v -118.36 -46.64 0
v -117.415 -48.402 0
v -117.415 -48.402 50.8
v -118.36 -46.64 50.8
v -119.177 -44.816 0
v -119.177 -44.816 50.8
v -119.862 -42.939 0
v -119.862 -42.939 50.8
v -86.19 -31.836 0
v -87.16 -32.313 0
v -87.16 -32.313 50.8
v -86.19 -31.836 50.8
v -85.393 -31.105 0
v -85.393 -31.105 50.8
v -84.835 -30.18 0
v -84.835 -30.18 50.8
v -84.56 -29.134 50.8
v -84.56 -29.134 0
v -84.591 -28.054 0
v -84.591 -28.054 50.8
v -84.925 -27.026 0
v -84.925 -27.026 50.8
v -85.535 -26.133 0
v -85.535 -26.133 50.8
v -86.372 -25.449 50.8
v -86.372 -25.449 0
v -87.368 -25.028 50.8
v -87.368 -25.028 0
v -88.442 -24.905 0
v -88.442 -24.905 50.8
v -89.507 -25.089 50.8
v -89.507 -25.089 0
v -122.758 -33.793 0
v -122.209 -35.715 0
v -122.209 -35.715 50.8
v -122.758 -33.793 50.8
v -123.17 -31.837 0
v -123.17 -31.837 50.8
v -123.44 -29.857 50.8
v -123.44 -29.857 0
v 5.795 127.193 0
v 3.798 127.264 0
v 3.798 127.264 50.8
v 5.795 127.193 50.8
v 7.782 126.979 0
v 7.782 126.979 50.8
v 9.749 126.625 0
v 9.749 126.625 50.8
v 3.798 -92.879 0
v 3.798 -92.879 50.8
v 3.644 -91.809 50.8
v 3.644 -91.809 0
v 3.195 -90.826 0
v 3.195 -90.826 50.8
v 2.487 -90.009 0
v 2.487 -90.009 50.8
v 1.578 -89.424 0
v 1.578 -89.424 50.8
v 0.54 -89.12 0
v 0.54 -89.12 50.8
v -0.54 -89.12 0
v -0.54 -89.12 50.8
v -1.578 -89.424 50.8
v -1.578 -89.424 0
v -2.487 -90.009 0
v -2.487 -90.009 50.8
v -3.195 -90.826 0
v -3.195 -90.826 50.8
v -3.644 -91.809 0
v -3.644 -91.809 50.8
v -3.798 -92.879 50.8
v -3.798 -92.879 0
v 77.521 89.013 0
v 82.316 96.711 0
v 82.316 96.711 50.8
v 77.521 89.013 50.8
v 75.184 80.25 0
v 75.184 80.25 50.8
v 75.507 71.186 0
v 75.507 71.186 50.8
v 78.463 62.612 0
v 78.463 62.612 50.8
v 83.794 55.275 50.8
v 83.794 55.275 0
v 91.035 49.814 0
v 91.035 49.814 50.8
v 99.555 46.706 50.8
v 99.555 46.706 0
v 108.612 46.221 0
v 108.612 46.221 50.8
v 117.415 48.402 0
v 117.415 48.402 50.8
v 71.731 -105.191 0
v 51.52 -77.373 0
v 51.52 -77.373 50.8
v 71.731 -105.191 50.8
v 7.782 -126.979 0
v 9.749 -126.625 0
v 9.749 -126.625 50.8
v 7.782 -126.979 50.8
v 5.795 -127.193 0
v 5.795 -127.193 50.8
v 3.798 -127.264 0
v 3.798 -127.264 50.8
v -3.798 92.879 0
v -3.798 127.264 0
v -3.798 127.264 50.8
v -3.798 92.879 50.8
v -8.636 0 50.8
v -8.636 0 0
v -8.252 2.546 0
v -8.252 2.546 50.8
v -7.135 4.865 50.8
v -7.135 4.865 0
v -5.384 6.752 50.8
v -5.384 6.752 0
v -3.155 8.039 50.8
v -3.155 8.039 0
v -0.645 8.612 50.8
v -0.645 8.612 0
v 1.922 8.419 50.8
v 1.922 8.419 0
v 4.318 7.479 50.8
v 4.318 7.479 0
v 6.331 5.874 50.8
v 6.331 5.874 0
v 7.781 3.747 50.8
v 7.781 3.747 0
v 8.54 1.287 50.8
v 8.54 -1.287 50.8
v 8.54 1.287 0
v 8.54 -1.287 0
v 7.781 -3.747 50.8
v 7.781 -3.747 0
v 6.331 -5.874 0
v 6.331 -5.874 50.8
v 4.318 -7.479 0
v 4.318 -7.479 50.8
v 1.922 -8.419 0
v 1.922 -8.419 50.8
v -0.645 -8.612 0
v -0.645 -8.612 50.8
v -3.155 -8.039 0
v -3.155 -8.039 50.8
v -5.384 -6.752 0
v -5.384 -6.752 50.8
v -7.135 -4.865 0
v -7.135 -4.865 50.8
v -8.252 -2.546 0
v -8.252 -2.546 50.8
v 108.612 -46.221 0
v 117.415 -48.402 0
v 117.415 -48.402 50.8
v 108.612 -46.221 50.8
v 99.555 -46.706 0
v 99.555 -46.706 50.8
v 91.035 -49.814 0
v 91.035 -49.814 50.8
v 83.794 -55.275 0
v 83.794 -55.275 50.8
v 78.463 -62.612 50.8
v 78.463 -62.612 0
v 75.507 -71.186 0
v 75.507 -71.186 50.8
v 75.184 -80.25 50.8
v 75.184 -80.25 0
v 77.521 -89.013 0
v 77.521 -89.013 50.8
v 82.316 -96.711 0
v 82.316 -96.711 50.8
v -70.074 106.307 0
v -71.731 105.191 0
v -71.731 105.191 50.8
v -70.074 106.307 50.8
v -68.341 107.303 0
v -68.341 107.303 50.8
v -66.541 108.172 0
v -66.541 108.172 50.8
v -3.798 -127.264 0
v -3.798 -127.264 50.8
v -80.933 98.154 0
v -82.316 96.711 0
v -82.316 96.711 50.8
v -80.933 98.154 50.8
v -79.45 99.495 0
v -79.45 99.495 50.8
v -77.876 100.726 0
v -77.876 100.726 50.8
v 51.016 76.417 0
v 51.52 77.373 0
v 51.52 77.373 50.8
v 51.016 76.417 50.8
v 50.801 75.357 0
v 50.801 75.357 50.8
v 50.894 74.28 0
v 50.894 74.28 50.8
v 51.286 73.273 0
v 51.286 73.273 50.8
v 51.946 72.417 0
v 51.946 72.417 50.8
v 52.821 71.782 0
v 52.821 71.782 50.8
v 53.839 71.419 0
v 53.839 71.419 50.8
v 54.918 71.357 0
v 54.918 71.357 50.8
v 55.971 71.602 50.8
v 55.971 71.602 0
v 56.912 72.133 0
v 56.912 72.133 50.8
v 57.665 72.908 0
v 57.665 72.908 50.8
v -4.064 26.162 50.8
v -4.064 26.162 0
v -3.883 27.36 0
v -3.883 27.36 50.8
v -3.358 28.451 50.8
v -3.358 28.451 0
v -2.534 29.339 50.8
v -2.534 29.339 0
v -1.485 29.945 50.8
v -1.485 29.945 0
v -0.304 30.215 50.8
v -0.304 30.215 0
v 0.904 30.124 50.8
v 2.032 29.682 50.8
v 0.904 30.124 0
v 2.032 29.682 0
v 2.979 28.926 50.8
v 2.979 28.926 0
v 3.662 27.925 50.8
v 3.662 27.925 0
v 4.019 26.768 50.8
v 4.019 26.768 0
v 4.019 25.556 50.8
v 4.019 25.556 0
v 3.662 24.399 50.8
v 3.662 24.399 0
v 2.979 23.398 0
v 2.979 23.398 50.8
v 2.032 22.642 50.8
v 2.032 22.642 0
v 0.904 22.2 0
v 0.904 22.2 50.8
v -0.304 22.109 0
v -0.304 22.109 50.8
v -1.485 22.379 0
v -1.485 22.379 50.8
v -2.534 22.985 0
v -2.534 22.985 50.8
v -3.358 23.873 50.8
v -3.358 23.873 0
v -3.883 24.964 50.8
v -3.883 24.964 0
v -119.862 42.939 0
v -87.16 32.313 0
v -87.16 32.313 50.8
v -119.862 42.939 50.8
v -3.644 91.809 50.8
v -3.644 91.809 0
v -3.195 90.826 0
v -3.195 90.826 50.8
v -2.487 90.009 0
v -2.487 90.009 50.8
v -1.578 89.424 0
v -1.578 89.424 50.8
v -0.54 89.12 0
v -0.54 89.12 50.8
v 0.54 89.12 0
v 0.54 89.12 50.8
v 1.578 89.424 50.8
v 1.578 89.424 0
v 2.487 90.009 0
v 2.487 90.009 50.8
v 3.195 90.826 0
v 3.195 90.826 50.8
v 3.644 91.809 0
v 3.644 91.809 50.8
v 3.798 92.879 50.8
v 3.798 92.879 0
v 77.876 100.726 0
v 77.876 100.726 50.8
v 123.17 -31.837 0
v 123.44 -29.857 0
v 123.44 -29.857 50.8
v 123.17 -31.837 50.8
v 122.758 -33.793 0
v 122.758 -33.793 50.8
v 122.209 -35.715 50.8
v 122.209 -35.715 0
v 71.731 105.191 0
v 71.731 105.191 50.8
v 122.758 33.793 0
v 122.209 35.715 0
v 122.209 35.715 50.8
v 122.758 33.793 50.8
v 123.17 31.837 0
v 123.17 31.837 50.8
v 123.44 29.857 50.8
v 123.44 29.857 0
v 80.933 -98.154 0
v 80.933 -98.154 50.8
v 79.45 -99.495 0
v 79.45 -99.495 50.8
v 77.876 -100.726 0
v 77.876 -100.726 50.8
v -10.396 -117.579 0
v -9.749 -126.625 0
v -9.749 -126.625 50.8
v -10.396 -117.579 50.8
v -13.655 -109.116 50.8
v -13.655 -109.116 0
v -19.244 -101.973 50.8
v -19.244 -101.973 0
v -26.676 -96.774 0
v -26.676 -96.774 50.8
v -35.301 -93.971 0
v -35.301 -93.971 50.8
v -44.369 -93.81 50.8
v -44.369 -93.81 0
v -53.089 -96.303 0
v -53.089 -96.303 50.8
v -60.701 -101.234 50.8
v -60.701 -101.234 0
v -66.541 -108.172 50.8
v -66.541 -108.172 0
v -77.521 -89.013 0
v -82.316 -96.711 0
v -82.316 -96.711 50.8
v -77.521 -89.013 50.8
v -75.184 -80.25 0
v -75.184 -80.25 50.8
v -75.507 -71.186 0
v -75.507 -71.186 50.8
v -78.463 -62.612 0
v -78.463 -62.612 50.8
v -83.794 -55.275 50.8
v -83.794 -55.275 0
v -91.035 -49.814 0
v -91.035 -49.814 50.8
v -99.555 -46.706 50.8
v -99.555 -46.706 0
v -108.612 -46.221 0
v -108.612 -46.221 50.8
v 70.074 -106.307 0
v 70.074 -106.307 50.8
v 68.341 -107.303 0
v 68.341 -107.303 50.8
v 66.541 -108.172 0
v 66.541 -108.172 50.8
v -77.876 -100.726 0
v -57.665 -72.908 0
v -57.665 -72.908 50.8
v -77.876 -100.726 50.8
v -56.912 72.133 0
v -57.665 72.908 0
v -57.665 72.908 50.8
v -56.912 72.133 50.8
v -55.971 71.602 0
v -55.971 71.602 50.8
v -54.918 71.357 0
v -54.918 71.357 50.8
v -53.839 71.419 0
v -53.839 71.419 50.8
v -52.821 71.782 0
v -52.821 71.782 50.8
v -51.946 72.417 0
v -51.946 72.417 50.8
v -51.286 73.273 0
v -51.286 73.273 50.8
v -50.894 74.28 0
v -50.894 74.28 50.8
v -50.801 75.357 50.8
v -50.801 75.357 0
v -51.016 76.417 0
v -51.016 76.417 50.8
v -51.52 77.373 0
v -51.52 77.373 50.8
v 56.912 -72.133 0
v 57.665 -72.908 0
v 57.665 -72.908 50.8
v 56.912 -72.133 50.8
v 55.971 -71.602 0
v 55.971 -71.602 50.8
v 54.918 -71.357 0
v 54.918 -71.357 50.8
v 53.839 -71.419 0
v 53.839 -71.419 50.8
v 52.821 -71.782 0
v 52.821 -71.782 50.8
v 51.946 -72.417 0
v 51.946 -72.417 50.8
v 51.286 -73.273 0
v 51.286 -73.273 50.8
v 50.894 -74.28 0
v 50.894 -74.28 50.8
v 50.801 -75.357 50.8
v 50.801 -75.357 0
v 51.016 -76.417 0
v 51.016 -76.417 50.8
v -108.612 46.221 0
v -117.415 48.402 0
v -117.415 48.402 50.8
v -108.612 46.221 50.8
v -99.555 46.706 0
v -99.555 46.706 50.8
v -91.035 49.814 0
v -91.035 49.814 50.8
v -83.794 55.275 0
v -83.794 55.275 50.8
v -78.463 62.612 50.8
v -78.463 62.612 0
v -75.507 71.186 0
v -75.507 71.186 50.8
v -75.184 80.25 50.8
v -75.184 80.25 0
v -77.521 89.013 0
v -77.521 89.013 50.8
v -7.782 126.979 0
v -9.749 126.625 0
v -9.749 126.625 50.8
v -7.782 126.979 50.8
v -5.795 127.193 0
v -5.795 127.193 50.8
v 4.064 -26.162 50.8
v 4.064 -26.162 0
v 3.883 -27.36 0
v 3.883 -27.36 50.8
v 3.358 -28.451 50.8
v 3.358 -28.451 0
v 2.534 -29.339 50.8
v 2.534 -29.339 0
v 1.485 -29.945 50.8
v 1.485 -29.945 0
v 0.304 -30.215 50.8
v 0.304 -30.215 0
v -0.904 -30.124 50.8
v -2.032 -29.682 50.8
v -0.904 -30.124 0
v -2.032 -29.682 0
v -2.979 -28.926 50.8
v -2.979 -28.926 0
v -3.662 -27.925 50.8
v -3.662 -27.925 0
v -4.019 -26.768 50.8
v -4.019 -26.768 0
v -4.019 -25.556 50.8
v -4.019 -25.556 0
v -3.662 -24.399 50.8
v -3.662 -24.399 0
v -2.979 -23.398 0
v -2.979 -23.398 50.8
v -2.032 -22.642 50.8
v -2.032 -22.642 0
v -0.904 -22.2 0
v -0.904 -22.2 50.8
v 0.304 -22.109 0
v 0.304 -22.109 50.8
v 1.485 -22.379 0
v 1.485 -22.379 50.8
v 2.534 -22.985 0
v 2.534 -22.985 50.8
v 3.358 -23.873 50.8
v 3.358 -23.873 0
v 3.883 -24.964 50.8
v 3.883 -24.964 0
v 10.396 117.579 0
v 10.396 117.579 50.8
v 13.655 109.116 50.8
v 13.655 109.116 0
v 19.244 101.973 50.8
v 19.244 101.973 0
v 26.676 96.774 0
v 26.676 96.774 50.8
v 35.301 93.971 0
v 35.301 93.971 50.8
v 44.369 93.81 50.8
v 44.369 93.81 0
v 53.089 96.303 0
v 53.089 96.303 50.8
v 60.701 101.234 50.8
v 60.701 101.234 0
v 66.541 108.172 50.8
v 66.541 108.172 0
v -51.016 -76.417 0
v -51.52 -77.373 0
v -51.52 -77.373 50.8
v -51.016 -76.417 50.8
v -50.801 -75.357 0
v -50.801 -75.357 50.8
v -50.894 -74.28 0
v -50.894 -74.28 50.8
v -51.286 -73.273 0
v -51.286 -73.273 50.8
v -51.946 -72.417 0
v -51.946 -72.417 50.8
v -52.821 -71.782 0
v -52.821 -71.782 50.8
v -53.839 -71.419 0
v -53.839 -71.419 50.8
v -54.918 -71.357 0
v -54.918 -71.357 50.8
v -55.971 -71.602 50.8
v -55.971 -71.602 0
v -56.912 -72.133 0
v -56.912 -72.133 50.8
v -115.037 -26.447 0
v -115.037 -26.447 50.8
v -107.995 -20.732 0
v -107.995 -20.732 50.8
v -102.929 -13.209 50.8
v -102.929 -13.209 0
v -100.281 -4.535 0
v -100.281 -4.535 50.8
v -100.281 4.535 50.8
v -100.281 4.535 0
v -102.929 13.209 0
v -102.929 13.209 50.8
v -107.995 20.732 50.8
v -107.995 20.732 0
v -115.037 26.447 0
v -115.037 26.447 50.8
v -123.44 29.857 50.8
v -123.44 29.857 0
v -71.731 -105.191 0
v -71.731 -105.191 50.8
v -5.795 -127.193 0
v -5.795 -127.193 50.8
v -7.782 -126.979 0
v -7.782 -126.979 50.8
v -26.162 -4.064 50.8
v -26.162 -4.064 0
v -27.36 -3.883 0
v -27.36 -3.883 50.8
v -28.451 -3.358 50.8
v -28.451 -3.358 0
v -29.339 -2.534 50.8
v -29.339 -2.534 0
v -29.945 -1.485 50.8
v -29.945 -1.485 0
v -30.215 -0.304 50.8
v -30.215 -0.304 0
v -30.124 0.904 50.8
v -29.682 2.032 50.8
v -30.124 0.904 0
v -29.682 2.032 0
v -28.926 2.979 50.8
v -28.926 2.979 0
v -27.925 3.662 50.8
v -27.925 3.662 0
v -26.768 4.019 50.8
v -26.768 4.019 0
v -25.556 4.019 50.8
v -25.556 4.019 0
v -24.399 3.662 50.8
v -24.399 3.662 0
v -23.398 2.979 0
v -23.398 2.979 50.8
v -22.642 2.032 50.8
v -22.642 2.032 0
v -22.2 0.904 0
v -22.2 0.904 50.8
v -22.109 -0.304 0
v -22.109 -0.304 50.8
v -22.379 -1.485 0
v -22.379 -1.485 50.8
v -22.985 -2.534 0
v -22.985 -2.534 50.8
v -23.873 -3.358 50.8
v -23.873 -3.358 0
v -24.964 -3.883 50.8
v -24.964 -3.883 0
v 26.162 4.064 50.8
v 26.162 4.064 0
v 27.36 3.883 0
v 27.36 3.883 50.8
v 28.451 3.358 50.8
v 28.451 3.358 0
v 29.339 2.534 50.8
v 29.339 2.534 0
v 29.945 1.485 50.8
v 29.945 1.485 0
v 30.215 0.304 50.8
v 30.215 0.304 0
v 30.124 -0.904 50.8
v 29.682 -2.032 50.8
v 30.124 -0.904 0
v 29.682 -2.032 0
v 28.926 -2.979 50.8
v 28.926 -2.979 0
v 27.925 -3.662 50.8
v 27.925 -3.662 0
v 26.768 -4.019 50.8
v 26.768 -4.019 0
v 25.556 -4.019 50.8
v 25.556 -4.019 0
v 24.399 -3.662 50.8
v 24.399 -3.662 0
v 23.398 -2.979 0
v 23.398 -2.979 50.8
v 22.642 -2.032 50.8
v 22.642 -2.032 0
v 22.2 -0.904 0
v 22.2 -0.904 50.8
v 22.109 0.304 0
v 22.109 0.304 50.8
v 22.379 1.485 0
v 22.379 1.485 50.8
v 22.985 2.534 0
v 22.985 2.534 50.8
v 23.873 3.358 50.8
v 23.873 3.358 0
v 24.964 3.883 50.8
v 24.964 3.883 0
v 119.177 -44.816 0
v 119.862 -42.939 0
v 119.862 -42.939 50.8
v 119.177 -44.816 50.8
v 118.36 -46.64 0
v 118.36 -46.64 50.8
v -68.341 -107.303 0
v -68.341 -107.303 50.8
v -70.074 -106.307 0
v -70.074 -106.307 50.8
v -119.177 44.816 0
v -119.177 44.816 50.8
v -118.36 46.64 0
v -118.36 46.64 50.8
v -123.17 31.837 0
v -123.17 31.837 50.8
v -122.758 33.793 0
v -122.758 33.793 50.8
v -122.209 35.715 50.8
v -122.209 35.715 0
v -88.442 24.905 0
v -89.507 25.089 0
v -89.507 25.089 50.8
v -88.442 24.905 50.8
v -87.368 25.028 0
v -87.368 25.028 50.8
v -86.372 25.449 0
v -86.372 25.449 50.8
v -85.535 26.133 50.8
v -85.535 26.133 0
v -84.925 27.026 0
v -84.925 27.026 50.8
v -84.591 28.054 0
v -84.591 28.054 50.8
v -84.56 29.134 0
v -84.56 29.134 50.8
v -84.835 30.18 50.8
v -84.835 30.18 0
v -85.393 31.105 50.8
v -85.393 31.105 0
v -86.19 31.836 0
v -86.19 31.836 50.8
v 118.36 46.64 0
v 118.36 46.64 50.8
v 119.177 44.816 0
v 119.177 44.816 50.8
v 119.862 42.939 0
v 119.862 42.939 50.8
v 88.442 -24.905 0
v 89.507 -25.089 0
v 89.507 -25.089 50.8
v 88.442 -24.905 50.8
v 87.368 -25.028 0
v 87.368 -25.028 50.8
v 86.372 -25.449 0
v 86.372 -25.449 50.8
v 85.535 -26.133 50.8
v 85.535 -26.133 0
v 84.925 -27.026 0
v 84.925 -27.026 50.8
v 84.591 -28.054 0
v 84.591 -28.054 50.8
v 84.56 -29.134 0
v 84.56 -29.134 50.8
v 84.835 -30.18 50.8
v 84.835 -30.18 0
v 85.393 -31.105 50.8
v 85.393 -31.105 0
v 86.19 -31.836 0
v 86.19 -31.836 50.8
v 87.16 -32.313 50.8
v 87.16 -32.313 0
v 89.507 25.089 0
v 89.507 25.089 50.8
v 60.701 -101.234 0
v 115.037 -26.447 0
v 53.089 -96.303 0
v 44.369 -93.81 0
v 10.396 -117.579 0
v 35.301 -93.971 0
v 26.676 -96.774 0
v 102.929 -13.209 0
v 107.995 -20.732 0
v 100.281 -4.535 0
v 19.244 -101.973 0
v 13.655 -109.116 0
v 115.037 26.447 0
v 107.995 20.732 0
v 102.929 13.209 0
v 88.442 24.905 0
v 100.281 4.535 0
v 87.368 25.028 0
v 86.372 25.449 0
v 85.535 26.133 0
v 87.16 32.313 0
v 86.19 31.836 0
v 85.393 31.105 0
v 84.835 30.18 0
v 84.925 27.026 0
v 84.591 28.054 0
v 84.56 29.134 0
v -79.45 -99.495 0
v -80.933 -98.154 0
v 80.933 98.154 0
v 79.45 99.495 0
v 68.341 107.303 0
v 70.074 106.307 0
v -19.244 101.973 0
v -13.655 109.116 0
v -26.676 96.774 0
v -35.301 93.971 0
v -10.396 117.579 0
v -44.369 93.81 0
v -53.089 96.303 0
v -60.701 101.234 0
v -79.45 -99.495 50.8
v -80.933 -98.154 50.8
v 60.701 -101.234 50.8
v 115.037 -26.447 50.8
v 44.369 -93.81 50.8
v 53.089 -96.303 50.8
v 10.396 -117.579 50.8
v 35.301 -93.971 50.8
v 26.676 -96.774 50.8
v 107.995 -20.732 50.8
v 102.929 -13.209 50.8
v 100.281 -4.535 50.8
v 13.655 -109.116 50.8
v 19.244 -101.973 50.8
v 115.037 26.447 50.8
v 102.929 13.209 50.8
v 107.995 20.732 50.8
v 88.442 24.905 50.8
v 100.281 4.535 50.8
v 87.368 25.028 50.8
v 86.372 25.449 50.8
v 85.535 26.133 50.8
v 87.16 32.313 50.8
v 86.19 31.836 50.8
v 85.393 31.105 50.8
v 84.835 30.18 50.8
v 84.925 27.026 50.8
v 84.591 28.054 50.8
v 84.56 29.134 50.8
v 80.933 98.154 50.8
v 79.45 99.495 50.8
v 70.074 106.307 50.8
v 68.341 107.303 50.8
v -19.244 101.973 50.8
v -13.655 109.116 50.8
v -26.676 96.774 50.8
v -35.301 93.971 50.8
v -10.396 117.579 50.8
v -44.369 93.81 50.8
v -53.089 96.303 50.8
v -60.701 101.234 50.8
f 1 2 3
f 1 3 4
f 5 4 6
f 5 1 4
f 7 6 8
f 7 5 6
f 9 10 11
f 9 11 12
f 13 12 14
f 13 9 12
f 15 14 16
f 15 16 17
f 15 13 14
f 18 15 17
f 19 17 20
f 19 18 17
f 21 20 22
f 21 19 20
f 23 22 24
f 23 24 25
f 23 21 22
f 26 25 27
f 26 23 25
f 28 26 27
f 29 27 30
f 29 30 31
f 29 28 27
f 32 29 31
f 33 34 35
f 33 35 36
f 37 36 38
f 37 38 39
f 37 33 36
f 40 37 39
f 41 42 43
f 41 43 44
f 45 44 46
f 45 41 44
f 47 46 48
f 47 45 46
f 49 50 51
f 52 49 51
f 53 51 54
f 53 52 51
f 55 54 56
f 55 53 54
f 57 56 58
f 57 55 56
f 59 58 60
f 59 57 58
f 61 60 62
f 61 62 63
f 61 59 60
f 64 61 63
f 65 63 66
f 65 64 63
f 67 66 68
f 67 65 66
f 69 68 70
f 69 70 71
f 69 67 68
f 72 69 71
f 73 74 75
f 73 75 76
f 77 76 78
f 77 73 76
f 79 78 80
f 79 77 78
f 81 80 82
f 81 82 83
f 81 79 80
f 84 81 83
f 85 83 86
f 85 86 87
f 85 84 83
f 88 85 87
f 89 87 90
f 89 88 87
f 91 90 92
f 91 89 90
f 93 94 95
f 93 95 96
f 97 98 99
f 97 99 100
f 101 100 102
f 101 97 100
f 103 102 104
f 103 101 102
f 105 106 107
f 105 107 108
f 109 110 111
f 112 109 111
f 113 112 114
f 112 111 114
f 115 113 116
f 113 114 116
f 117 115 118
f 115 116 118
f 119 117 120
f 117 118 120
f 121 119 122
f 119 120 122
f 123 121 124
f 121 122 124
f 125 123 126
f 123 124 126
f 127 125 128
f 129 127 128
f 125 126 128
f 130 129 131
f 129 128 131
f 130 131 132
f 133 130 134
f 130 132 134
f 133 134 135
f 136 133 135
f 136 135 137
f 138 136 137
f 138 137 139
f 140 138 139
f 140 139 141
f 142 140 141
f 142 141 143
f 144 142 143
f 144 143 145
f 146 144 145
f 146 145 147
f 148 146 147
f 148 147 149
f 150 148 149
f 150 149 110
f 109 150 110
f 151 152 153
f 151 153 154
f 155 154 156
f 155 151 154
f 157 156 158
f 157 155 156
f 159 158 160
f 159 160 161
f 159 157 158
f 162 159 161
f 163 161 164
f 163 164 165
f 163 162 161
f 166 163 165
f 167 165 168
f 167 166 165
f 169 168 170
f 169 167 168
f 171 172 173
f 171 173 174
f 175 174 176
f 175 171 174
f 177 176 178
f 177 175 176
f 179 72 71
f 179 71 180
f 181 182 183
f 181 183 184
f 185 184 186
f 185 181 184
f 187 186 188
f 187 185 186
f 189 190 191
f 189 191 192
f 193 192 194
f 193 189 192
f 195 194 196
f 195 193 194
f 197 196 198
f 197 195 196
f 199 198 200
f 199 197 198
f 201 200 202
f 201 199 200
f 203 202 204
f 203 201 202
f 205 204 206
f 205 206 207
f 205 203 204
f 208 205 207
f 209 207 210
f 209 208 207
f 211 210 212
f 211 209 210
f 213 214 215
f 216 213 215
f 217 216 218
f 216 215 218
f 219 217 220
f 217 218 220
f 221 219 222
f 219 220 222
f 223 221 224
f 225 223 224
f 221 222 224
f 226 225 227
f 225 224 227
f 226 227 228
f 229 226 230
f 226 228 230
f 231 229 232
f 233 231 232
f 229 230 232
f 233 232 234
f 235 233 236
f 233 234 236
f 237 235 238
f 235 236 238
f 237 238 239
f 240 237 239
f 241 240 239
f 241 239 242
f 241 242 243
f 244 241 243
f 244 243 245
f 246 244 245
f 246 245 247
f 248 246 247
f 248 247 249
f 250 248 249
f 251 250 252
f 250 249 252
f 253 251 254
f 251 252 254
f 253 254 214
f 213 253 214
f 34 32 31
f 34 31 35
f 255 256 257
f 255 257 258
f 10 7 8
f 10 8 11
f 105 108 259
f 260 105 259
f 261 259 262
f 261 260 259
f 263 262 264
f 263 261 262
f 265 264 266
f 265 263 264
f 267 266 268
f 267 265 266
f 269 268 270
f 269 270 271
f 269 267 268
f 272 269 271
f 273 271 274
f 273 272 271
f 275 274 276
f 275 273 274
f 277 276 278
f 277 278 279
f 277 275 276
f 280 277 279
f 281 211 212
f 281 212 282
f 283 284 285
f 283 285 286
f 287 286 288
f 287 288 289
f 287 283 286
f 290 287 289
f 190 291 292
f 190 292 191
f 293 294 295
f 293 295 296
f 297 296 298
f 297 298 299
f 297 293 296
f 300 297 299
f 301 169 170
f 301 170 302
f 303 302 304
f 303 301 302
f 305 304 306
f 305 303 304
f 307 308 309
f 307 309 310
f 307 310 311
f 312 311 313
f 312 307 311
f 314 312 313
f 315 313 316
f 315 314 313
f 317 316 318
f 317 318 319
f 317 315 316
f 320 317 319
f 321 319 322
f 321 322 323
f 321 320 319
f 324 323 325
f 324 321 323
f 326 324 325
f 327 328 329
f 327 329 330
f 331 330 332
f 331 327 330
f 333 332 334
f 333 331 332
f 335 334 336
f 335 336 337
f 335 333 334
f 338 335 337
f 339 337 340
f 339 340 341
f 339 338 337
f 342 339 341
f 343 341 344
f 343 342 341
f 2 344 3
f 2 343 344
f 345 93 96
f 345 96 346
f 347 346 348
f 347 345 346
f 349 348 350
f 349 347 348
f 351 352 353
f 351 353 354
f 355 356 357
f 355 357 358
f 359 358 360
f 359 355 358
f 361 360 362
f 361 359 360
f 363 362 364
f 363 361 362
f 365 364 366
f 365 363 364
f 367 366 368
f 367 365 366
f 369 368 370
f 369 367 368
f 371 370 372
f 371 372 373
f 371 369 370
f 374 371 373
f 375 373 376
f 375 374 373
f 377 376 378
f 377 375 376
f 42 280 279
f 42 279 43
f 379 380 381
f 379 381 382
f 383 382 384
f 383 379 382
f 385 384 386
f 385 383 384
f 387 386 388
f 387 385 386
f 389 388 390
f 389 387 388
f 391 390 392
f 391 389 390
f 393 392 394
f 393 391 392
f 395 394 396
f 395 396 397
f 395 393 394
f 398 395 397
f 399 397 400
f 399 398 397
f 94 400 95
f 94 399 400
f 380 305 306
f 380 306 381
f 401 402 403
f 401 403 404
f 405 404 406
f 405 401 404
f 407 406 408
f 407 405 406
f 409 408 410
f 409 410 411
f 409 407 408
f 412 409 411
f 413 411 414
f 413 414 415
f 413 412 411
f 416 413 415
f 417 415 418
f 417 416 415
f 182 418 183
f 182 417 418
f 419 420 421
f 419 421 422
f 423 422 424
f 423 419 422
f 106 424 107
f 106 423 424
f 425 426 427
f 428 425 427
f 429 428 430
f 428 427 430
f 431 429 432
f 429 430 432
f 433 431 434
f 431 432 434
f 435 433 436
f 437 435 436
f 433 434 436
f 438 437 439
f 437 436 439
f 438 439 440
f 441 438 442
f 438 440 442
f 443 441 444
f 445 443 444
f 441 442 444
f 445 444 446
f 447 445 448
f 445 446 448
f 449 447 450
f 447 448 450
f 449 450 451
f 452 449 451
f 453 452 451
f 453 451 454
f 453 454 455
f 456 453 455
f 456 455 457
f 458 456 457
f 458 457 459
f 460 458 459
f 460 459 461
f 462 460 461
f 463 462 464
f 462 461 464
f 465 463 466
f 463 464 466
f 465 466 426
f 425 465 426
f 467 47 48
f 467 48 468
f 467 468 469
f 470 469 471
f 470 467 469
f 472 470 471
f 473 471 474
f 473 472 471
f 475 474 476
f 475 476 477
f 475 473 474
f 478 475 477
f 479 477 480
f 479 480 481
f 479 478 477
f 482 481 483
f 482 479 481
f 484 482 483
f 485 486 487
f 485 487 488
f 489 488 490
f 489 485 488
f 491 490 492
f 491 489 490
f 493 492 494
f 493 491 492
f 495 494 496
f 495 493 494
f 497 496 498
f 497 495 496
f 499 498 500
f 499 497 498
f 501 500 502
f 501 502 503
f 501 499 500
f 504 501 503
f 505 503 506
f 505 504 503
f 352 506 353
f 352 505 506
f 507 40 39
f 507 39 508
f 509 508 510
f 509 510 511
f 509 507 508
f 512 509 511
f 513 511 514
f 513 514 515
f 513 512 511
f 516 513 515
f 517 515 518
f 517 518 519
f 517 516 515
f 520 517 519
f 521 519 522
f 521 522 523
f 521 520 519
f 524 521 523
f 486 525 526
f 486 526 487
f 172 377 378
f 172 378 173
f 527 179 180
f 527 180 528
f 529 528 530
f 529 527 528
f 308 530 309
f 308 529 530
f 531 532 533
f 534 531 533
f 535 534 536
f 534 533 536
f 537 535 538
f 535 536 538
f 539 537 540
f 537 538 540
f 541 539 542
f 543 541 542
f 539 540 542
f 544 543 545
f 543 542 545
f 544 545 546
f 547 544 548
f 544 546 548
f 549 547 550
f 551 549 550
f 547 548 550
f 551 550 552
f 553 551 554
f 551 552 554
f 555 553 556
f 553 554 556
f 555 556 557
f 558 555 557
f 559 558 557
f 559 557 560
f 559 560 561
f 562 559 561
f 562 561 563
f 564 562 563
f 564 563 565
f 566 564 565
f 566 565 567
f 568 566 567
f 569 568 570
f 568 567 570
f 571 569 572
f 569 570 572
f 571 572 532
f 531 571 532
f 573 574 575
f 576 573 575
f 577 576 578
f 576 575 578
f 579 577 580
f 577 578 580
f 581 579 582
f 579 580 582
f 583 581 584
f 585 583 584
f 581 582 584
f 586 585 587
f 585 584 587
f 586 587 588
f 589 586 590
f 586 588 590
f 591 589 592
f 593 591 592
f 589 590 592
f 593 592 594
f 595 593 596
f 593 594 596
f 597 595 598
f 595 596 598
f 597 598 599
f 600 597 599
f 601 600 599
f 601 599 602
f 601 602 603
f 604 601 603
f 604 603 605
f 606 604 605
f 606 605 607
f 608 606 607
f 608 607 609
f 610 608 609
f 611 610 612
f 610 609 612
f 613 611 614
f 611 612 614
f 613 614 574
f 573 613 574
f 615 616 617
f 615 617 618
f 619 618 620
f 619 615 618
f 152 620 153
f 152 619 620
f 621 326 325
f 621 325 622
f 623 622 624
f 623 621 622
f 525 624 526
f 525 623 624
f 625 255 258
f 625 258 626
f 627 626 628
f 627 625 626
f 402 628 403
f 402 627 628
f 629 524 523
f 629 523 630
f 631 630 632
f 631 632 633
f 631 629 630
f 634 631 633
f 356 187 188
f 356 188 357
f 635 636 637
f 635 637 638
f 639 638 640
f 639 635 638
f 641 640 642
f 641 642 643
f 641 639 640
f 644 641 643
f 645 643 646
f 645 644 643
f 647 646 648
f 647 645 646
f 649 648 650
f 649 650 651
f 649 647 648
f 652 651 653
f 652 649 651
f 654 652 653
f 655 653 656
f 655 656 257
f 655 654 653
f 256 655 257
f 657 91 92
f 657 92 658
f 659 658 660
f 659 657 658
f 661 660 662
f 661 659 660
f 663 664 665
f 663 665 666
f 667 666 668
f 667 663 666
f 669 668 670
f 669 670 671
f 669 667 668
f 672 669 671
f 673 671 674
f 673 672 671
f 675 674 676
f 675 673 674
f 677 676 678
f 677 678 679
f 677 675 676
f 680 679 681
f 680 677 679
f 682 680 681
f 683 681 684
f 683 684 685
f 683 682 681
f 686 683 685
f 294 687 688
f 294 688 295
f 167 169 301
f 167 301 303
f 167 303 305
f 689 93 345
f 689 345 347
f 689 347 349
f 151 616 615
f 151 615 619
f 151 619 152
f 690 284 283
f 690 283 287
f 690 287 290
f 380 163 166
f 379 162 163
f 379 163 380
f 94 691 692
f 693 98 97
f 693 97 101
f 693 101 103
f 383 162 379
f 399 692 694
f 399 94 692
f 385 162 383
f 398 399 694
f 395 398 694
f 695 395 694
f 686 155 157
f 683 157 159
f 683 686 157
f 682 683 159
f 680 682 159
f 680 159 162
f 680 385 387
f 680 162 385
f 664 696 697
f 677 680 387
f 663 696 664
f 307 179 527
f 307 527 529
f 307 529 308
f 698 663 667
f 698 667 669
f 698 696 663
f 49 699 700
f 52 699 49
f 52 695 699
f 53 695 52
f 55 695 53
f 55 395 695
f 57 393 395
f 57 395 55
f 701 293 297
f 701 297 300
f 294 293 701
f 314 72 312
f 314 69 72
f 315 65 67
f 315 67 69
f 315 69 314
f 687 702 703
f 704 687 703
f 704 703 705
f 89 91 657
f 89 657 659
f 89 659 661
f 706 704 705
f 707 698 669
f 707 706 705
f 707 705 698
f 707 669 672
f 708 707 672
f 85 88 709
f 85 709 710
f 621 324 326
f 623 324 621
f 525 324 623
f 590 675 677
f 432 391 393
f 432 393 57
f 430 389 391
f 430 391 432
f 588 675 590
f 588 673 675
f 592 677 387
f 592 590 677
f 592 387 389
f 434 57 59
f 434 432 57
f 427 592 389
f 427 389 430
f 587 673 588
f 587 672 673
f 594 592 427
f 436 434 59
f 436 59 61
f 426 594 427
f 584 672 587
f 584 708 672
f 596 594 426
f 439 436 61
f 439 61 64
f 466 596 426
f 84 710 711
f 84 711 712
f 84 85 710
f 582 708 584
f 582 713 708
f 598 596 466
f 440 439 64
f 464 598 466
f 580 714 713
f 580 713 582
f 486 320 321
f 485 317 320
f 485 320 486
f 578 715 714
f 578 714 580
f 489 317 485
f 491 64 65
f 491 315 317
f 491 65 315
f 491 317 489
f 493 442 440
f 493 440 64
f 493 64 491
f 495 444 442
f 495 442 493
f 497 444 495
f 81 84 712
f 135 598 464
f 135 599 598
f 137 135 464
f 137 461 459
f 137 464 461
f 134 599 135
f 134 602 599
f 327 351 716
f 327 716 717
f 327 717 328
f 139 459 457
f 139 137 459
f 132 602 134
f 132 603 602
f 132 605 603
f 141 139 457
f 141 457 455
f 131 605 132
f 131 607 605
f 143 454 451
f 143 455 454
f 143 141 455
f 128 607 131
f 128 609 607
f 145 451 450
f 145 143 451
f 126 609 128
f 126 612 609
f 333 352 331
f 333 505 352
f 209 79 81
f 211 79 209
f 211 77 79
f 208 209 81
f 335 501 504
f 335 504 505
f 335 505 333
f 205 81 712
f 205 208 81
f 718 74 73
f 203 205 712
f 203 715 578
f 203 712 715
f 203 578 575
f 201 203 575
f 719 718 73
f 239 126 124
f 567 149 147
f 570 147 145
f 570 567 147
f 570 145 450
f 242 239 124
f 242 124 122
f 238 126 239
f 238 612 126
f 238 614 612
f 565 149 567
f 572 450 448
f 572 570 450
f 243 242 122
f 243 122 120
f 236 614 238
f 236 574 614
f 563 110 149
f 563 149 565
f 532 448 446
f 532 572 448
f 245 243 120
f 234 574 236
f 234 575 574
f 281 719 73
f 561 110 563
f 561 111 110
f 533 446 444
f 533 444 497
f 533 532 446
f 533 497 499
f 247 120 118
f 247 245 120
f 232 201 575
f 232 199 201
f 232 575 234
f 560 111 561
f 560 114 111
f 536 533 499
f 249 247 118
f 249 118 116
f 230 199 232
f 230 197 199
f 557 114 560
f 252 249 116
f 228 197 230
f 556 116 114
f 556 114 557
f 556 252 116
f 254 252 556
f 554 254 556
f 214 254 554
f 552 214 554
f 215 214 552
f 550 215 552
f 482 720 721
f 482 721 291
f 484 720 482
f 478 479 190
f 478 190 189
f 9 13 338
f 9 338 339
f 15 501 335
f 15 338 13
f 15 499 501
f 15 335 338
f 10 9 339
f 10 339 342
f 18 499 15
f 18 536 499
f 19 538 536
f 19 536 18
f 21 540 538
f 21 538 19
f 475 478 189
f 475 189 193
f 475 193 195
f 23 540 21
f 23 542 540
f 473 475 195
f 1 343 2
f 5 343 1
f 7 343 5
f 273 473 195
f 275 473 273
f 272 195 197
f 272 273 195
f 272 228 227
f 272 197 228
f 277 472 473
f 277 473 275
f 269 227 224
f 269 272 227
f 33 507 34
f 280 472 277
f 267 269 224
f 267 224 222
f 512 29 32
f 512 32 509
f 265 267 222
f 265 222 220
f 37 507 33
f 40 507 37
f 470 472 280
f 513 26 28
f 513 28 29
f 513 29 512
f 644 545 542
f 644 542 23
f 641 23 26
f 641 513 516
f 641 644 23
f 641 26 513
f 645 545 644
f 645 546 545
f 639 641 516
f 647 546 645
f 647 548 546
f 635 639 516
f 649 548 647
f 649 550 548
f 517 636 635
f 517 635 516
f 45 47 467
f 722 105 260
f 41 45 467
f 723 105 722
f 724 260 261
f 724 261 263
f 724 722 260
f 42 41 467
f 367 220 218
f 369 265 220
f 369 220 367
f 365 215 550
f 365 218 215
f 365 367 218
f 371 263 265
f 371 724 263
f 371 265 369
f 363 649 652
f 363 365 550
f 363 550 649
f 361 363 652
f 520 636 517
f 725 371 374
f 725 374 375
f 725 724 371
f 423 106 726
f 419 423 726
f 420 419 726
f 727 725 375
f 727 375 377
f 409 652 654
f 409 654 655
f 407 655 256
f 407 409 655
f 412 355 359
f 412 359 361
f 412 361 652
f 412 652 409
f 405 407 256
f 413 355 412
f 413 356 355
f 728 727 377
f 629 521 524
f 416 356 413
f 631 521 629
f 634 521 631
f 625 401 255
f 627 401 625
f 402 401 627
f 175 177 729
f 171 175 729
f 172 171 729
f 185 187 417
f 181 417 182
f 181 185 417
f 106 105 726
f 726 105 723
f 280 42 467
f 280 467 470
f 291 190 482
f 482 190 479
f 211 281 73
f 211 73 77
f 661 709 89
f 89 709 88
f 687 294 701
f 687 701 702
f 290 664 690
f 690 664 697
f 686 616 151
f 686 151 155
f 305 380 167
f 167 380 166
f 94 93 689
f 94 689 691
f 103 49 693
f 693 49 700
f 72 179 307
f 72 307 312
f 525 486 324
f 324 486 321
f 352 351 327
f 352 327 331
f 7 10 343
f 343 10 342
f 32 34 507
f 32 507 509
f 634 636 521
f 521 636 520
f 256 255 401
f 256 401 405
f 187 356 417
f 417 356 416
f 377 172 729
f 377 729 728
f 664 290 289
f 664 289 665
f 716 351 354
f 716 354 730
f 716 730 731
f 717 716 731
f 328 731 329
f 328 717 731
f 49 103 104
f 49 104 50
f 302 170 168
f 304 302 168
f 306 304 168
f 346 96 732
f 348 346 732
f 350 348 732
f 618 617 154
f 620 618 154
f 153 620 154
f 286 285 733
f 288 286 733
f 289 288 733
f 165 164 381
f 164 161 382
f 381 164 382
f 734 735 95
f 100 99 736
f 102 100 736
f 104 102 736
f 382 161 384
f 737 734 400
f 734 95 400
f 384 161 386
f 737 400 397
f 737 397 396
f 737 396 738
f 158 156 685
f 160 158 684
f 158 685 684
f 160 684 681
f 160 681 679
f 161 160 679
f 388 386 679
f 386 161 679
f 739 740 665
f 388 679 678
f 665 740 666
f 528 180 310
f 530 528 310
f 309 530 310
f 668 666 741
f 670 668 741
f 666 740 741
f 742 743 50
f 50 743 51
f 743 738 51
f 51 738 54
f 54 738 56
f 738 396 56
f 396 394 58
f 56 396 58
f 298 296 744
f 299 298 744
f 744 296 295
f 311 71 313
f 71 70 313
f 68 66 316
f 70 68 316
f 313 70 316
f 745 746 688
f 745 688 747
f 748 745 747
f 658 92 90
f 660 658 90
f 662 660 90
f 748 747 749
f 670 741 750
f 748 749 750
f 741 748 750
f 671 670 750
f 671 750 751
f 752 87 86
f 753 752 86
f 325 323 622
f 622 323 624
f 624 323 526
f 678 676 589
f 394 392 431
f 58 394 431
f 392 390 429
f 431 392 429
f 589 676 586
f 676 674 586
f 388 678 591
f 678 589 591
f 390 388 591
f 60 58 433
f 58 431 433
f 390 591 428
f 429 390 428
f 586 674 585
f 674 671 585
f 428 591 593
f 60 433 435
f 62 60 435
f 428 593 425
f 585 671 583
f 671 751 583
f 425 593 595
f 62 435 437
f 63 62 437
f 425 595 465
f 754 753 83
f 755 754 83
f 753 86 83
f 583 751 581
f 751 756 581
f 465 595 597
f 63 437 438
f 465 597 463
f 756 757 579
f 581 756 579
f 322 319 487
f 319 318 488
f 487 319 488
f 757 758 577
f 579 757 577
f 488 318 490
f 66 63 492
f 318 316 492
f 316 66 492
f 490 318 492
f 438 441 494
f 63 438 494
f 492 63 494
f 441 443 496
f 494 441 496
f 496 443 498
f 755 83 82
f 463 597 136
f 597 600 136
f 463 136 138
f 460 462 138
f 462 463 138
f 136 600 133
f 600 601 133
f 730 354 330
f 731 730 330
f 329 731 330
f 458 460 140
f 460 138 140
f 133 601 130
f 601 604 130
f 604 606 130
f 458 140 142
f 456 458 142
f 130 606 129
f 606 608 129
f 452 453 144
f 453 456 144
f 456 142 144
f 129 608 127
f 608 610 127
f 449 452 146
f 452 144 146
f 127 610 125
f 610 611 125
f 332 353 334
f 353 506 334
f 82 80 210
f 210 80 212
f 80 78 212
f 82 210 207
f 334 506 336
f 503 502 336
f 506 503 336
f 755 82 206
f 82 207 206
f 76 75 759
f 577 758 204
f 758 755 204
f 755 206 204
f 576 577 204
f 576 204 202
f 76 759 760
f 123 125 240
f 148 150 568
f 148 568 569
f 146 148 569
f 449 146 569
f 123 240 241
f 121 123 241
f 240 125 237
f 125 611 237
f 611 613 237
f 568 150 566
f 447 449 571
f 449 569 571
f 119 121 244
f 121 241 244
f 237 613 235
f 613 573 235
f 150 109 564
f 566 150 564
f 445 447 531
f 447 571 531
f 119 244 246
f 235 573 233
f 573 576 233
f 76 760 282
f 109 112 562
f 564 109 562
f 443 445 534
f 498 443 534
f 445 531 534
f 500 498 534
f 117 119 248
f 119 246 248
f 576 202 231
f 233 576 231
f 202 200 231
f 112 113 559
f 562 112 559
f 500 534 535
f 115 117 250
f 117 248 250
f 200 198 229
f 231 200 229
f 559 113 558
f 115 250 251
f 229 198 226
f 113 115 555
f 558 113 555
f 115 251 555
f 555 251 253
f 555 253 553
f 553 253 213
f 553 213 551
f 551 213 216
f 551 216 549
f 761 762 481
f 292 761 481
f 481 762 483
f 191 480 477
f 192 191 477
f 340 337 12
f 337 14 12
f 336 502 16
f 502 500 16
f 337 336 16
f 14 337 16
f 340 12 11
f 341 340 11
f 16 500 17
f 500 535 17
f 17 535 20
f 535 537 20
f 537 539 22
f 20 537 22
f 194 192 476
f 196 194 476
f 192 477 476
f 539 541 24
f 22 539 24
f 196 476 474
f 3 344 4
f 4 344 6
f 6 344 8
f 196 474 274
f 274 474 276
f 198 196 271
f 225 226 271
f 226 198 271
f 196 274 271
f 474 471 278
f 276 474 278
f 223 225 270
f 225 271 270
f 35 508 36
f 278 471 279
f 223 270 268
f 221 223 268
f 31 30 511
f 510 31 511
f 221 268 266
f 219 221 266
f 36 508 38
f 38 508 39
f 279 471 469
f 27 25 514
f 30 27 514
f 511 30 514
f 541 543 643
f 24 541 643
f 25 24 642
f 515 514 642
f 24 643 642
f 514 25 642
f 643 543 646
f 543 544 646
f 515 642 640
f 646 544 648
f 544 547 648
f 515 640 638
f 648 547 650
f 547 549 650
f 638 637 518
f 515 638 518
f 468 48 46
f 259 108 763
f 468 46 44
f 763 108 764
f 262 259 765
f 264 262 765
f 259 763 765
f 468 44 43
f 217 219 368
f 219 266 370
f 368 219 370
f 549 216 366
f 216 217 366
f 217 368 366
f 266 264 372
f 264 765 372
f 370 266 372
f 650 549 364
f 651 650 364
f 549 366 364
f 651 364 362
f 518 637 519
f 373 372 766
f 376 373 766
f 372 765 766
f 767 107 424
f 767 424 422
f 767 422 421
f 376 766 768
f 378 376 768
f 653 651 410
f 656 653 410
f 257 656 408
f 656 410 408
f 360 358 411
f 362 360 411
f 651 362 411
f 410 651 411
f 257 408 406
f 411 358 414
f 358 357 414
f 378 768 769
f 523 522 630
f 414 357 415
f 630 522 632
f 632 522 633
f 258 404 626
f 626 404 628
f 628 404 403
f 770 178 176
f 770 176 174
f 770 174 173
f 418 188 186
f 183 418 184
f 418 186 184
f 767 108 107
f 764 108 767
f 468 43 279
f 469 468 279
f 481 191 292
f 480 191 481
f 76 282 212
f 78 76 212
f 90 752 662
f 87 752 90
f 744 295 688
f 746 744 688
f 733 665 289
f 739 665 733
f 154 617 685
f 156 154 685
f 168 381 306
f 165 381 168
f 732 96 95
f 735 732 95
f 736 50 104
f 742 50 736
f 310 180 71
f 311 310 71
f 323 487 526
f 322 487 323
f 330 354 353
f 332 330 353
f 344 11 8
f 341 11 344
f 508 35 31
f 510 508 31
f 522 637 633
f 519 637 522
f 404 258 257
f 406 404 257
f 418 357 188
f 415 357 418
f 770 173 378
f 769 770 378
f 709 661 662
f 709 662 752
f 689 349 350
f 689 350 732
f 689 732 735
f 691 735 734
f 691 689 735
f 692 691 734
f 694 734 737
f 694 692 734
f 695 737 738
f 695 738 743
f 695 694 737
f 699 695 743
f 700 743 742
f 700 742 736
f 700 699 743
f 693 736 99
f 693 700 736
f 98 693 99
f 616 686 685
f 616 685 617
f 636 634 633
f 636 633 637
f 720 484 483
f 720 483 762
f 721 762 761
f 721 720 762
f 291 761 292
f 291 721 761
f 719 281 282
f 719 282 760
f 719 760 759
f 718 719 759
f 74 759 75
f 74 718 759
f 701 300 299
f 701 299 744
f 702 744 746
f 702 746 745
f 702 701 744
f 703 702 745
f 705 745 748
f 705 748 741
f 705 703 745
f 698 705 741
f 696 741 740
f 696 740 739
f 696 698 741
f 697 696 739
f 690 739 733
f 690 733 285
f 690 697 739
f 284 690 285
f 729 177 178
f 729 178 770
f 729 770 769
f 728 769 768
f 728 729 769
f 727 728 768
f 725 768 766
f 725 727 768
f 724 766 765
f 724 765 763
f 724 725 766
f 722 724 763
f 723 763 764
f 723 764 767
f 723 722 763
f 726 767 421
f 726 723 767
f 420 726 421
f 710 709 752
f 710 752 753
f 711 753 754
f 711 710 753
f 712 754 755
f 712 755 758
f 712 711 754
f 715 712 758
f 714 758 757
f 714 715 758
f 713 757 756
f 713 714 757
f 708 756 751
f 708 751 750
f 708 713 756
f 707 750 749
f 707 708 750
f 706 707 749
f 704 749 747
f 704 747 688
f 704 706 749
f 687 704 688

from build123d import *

# Parameters (mm, degrees)
BOSS_EXTRUDE1_DEPTH = 50.8
SKETCH2_R           = 8.636
SKETCH2_R_2         = 4.064
CUT_EXTRUDE1_DEPTH  = 50.8
CIRPATTERN1_COUNT   = 4


with BuildPart() as part:
    # Sketch1 → Boss-Extrude1 (new body)
    with BuildSketch(Plane.XY):
        with BuildLine():
            Line((-3.797752579, 127.26397791), (-3.797752579, 92.878939343))
            ThreePointArc((-3.797752579, 92.878939343), (0, 89.081186764), (3.797752579, 92.878939343))
            Line((3.797752579, 92.878939343), (3.797752579, 127.26397791))
            ThreePointArc((3.797752579, 127.26397791), (6.790630722, 127.103835386), (9.749331178, 126.62523659))
            ThreePointArc((9.749331178, 126.62523659), (30.88440355, 95.052420362), (66.541072029, 108.172481405))
            ThreePointArc((66.541072029, 108.172481405), (69.216024294, 106.82059547), (71.731442986, 105.190983859))
            Line((71.731442986, 105.190983859), (51.520424417, 77.372903306))
            ThreePointArc((51.520424417, 77.372903306), (52.360607836, 72.068193971), (57.665317172, 72.90837739))
            Line((57.665317172, 72.90837739), (77.876335741, 100.726457943))
            ThreePointArc((77.876335741, 100.726457943), (80.203495606, 98.837730286), (82.315821243, 96.711455232))
            ThreePointArc((82.315821243, 96.711455232), (80.856418217, 58.745626497), (117.415047369, 48.40151497))
            ThreePointArc((117.415047369, 48.40151497), (118.784510595, 45.735518782), (119.861665394, 42.938609284))
            Line((119.861665394, 42.938609284), (87.159550401, 32.313048015))
            ThreePointArc((87.159550401, 32.313048015), (84.721243151, 27.527600589), (89.506690576, 25.089293339))
            Line((89.506690576, 25.089293339), (122.208805569, 35.714854608))
            ThreePointArc((122.208805569, 35.714854608), (122.981351186, 32.818971587), (123.440465405, 29.857185076))
            ThreePointArc((123.440465405, 29.857185076), (99.944029333, 0), (123.440465405, -29.857185076))
            ThreePointArc((123.440465405, -29.857185076), (122.981351186, -32.818971587), (122.208805569, -35.714854608))
            Line((122.208805569, -35.714854608), (89.506690576, -25.089293339))
            ThreePointArc((89.506690576, -25.089293339), (84.721243151, -27.527600589), (87.159550401, -32.313048015))
            Line((87.159550401, -32.313048015), (119.861665394, -42.938609284))
            ThreePointArc((119.861665394, -42.938609284), (118.784510595, -45.735518782), (117.415047369, -48.40151497))
            ThreePointArc((117.415047369, -48.40151497), (80.856418217, -58.745626497), (82.315821243, -96.711455232))
            ThreePointArc((82.315821243, -96.711455232), (80.203495606, -98.837730286), (77.876335741, -100.726457943))
            Line((77.876335741, -100.726457943), (57.665317172, -72.90837739))
            ThreePointArc((57.665317172, -72.90837739), (52.360607836, -72.068193971), (51.520424417, -77.372903306))
            Line((51.520424417, -77.372903306), (71.731442986, -105.190983859))
            ThreePointArc((71.731442986, -105.190983859), (69.216024294, -106.82059547), (66.541072029, -108.172481405))
            ThreePointArc((66.541072029, -108.172481405), (30.88440355, -95.052420362), (9.749331178, -126.62523659))
            ThreePointArc((9.749331178, -126.62523659), (6.790630722, -127.103835386), (3.797752579, -127.26397791))
            Line((3.797752579, -127.26397791), (3.797752579, -92.878939343))
            ThreePointArc((3.797752579, -92.878939343), (0, -89.081186764), (-3.797752579, -92.878939343))
            Line((-3.797752579, -92.878939343), (-3.797752579, -127.26397791))
            ThreePointArc((-3.797752579, -127.26397791), (-6.790630722, -127.103835386), (-9.749331178, -126.62523659))
            ThreePointArc((-9.749331178, -126.62523659), (-30.88440355, -95.052420362), (-66.541072029, -108.172481405))
            ThreePointArc((-66.541072029, -108.172481405), (-69.216024294, -106.82059547), (-71.731442986, -105.190983859))
            Line((-71.731442986, -105.190983859), (-51.520424417, -77.372903306))
            ThreePointArc((-51.520424417, -77.372903306), (-52.360607836, -72.068193971), (-57.665317172, -72.90837739))
            Line((-57.665317172, -72.90837739), (-77.876335741, -100.726457943))
            ThreePointArc((-77.876335741, -100.726457943), (-80.203495606, -98.837730286), (-82.315821243, -96.711455232))
            ThreePointArc((-82.315821243, -96.711455232), (-80.856418217, -58.745626497), (-117.415047369, -48.40151497))
            ThreePointArc((-117.415047369, -48.40151497), (-118.784510595, -45.735518782), (-119.861665394, -42.938609284))
            Line((-119.861665394, -42.938609284), (-87.159550401, -32.313048015))
            ThreePointArc((-87.159550401, -32.313048015), (-84.721243151, -27.527600589), (-89.506690576, -25.089293339))
            Line((-89.506690576, -25.089293339), (-122.208805569, -35.714854608))
            ThreePointArc((-122.208805569, -35.714854608), (-122.981351186, -32.818971587), (-123.440465405, -29.857185076))
            ThreePointArc((-123.440465405, -29.857185076), (-99.944029333, 0), (-123.440465405, 29.857185076))
            ThreePointArc((-123.440465405, 29.857185076), (-122.981351186, 32.818971587), (-122.208805569, 35.714854608))
            Line((-122.208805569, 35.714854608), (-89.506690576, 25.089293339))
            ThreePointArc((-89.506690576, 25.089293339), (-84.721243151, 27.527600589), (-87.159550401, 32.313048015))
            Line((-87.159550401, 32.313048015), (-119.861665394, 42.938609284))
            ThreePointArc((-119.861665394, 42.938609284), (-118.784510595, 45.735518782), (-117.415047369, 48.40151497))
            ThreePointArc((-117.415047369, 48.40151497), (-80.856418217, 58.745626497), (-82.315821243, 96.711455232))
            ThreePointArc((-82.315821243, 96.711455232), (-80.203495606, 98.837730286), (-77.876335741, 100.726457943))
            Line((-77.876335741, 100.726457943), (-57.665317172, 72.90837739))
            ThreePointArc((-57.665317172, 72.90837739), (-52.360607836, 72.068193971), (-51.520424417, 77.372903306))
            Line((-51.520424417, 77.372903306), (-71.731442986, 105.190983859))
            ThreePointArc((-71.731442986, 105.190983859), (-69.216024294, 106.82059547), (-66.541072029, 108.172481405))
            ThreePointArc((-66.541072029, 108.172481405), (-30.88440355, 95.052420362), (-9.749331178, 126.62523659))
            ThreePointArc((-9.749331178, 126.62523659), (-6.790630722, 127.103835386), (-3.797752579, 127.26397791))
        make_face()
    extrude(amount=BOSS_EXTRUDE1_DEPTH)

    # Sketch2 → Cut-Extrude1 (cut)
    with BuildSketch(Plane(origin=(0, 0, 0), x_dir=(-1, 0, 0), z_dir=(0, 0, -1))):
        Circle(SKETCH2_R)
        with Locations((0, 26.162)):
            Circle(SKETCH2_R_2)
    cut_extrude1 = extrude(amount=-CUT_EXTRUDE1_DEPTH, mode=Mode.SUBTRACT)

    # CirPattern1: Cut-Extrude1 ×4 about axis
    cirpattern1_axis = Axis((0, 0, 50.8), (0, 0, -1))
    for i in range(1, CIRPATTERN1_COUNT):
        add(cut_extrude1.rotate(cirpattern1_axis, i * 360 / CIRPATTERN1_COUNT), mode=Mode.SUBTRACT)


solid = part.part
